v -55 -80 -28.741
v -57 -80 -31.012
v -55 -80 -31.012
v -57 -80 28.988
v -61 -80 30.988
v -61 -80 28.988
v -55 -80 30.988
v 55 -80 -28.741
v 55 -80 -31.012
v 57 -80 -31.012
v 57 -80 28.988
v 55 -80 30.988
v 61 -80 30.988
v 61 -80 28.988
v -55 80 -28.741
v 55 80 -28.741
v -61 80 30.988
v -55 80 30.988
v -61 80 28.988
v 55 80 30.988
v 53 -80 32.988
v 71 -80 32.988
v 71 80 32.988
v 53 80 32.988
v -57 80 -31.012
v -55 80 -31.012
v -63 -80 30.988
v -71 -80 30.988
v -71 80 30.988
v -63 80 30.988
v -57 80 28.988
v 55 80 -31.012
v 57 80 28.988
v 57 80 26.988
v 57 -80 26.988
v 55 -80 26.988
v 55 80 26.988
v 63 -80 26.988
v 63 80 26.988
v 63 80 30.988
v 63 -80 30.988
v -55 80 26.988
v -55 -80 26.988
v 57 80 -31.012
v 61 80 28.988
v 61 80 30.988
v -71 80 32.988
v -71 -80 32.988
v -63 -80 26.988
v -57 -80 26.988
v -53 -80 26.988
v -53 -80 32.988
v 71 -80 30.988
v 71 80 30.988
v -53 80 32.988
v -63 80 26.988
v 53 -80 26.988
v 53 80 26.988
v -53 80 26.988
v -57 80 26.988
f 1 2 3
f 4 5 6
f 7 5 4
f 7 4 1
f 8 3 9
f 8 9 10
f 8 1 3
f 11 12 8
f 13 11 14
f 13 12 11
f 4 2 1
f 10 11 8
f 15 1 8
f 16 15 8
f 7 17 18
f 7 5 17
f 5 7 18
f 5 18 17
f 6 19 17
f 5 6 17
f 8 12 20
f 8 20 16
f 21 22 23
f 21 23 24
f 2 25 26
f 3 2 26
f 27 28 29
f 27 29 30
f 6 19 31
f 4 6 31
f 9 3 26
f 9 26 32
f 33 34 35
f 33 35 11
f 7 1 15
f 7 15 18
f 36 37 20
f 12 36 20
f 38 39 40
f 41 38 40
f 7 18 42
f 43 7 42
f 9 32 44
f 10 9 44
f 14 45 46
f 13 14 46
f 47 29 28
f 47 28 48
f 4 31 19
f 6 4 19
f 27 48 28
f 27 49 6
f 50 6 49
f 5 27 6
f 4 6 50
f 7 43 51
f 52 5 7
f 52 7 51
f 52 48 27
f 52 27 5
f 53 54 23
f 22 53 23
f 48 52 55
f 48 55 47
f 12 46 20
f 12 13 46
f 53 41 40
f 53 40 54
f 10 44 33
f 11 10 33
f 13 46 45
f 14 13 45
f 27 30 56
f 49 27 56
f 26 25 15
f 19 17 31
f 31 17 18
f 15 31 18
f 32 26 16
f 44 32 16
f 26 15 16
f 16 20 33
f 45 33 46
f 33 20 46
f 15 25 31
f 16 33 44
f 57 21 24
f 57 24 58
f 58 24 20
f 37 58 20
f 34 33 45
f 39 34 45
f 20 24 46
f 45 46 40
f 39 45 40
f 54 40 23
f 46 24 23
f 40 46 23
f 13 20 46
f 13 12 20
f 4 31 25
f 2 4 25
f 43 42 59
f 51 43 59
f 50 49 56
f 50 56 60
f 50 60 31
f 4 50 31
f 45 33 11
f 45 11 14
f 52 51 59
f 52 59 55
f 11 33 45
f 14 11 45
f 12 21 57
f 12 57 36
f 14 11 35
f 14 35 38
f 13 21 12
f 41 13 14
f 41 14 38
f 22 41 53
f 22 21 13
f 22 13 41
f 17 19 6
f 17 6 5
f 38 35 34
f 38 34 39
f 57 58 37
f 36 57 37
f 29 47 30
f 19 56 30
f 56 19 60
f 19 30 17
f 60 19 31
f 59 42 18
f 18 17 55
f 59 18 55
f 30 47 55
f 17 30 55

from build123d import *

# Parameters (mm, degrees)
F0_W          = 4
F0_H          = 2
F0_W_2        = 2
F0_W_3        = 8
F1_DEPTH      = 80
F1_DEPTH_BACK = 80
F0_W_4        = 110
F0_H_2        = 2.270985
F2_DEPTH      = 80
F2_DEPTH_BACK = 80


with BuildPart() as f1:
    # F0 (on Front) → F1 (new body, two sides)
    with BuildSketch(Plane.XZ) as f1_sk:
        Polygon((55, 32.988115), (55, 30.988115), (61, 30.988115), (63, 30.988115), (71, 30.988115), (71, 32.988115), align=None)
        Polygon((63, 30.988115), (61, 30.988115), (61, 28.988115), (61, 26.988115), (63, 26.988115), align=None)
        with Locations((59, 27.988115)):
            Rectangle(F0_W, F0_H)
        Polygon((55, 28.988115), (55, 30.988115), (55, 32.988115), (53, 32.988115), (53, 26.988115), (55, 26.988115), align=None)
        Polygon((-55, 28.988115), (-55, 26.988115), (-53, 26.988115), (-53, 32.988115), (-55, 32.988115), (-55, 30.988115), align=None)
        Polygon((-57, 30.988115), (-55, 30.988115), (-55, 32.988115), (-61, 32.988115), (-61, 30.988115), align=None)
        with Locations((-62, 31.988115)):
            Rectangle(F0_W_2, F0_H)
        with Locations((-62, 29.988115)):
            Rectangle(F0_W_2, F0_H)
        Polygon((-63, 26.988115), (-57, 26.988115), (-57, 28.988115), (-61, 28.988115), (-63, 28.988115), align=None)
        with Locations((-67, 31.988115)):
            Rectangle(F0_W_3, F0_H)
    extrude(amount=F1_DEPTH)
    extrude(f1_sk.sketch, amount=-F1_DEPTH_BACK)


with BuildPart() as f2:
    # F0 (on Front) → F2 (new body, two sides)
    with BuildSketch(Plane.XZ) as f2_sk:
        Polygon((61, 30.988115), (55, 30.988115), (55, 28.988115), (57, 28.988115), (61, 28.988115), align=None)
        Polygon((57, 28.988115), (55, 28.988115), (55, 26.988115), (55, -28.7409), (55, -31.011885), (57, -31.011885), (57, 26.988115), align=None)
        with Locations((0, -29.876393)):
            Rectangle(F0_W_4, F0_H_2)
        Polygon((-55, -31.011885), (-55, -28.7409), (-55, 26.988115), (-55, 28.988115), (-57, 28.988115), (-57, 26.988115), (-57, -31.011885), align=None)
        with Locations((-59, 29.988115)):
            Rectangle(F0_W, F0_H)
        with Locations((-56, 29.988115)):
            Rectangle(F0_W_2, F0_H)
    extrude(amount=F2_DEPTH)
    extrude(f2_sk.sketch, amount=-F2_DEPTH_BACK)


solid = Compound([f1.part, f2.part])
